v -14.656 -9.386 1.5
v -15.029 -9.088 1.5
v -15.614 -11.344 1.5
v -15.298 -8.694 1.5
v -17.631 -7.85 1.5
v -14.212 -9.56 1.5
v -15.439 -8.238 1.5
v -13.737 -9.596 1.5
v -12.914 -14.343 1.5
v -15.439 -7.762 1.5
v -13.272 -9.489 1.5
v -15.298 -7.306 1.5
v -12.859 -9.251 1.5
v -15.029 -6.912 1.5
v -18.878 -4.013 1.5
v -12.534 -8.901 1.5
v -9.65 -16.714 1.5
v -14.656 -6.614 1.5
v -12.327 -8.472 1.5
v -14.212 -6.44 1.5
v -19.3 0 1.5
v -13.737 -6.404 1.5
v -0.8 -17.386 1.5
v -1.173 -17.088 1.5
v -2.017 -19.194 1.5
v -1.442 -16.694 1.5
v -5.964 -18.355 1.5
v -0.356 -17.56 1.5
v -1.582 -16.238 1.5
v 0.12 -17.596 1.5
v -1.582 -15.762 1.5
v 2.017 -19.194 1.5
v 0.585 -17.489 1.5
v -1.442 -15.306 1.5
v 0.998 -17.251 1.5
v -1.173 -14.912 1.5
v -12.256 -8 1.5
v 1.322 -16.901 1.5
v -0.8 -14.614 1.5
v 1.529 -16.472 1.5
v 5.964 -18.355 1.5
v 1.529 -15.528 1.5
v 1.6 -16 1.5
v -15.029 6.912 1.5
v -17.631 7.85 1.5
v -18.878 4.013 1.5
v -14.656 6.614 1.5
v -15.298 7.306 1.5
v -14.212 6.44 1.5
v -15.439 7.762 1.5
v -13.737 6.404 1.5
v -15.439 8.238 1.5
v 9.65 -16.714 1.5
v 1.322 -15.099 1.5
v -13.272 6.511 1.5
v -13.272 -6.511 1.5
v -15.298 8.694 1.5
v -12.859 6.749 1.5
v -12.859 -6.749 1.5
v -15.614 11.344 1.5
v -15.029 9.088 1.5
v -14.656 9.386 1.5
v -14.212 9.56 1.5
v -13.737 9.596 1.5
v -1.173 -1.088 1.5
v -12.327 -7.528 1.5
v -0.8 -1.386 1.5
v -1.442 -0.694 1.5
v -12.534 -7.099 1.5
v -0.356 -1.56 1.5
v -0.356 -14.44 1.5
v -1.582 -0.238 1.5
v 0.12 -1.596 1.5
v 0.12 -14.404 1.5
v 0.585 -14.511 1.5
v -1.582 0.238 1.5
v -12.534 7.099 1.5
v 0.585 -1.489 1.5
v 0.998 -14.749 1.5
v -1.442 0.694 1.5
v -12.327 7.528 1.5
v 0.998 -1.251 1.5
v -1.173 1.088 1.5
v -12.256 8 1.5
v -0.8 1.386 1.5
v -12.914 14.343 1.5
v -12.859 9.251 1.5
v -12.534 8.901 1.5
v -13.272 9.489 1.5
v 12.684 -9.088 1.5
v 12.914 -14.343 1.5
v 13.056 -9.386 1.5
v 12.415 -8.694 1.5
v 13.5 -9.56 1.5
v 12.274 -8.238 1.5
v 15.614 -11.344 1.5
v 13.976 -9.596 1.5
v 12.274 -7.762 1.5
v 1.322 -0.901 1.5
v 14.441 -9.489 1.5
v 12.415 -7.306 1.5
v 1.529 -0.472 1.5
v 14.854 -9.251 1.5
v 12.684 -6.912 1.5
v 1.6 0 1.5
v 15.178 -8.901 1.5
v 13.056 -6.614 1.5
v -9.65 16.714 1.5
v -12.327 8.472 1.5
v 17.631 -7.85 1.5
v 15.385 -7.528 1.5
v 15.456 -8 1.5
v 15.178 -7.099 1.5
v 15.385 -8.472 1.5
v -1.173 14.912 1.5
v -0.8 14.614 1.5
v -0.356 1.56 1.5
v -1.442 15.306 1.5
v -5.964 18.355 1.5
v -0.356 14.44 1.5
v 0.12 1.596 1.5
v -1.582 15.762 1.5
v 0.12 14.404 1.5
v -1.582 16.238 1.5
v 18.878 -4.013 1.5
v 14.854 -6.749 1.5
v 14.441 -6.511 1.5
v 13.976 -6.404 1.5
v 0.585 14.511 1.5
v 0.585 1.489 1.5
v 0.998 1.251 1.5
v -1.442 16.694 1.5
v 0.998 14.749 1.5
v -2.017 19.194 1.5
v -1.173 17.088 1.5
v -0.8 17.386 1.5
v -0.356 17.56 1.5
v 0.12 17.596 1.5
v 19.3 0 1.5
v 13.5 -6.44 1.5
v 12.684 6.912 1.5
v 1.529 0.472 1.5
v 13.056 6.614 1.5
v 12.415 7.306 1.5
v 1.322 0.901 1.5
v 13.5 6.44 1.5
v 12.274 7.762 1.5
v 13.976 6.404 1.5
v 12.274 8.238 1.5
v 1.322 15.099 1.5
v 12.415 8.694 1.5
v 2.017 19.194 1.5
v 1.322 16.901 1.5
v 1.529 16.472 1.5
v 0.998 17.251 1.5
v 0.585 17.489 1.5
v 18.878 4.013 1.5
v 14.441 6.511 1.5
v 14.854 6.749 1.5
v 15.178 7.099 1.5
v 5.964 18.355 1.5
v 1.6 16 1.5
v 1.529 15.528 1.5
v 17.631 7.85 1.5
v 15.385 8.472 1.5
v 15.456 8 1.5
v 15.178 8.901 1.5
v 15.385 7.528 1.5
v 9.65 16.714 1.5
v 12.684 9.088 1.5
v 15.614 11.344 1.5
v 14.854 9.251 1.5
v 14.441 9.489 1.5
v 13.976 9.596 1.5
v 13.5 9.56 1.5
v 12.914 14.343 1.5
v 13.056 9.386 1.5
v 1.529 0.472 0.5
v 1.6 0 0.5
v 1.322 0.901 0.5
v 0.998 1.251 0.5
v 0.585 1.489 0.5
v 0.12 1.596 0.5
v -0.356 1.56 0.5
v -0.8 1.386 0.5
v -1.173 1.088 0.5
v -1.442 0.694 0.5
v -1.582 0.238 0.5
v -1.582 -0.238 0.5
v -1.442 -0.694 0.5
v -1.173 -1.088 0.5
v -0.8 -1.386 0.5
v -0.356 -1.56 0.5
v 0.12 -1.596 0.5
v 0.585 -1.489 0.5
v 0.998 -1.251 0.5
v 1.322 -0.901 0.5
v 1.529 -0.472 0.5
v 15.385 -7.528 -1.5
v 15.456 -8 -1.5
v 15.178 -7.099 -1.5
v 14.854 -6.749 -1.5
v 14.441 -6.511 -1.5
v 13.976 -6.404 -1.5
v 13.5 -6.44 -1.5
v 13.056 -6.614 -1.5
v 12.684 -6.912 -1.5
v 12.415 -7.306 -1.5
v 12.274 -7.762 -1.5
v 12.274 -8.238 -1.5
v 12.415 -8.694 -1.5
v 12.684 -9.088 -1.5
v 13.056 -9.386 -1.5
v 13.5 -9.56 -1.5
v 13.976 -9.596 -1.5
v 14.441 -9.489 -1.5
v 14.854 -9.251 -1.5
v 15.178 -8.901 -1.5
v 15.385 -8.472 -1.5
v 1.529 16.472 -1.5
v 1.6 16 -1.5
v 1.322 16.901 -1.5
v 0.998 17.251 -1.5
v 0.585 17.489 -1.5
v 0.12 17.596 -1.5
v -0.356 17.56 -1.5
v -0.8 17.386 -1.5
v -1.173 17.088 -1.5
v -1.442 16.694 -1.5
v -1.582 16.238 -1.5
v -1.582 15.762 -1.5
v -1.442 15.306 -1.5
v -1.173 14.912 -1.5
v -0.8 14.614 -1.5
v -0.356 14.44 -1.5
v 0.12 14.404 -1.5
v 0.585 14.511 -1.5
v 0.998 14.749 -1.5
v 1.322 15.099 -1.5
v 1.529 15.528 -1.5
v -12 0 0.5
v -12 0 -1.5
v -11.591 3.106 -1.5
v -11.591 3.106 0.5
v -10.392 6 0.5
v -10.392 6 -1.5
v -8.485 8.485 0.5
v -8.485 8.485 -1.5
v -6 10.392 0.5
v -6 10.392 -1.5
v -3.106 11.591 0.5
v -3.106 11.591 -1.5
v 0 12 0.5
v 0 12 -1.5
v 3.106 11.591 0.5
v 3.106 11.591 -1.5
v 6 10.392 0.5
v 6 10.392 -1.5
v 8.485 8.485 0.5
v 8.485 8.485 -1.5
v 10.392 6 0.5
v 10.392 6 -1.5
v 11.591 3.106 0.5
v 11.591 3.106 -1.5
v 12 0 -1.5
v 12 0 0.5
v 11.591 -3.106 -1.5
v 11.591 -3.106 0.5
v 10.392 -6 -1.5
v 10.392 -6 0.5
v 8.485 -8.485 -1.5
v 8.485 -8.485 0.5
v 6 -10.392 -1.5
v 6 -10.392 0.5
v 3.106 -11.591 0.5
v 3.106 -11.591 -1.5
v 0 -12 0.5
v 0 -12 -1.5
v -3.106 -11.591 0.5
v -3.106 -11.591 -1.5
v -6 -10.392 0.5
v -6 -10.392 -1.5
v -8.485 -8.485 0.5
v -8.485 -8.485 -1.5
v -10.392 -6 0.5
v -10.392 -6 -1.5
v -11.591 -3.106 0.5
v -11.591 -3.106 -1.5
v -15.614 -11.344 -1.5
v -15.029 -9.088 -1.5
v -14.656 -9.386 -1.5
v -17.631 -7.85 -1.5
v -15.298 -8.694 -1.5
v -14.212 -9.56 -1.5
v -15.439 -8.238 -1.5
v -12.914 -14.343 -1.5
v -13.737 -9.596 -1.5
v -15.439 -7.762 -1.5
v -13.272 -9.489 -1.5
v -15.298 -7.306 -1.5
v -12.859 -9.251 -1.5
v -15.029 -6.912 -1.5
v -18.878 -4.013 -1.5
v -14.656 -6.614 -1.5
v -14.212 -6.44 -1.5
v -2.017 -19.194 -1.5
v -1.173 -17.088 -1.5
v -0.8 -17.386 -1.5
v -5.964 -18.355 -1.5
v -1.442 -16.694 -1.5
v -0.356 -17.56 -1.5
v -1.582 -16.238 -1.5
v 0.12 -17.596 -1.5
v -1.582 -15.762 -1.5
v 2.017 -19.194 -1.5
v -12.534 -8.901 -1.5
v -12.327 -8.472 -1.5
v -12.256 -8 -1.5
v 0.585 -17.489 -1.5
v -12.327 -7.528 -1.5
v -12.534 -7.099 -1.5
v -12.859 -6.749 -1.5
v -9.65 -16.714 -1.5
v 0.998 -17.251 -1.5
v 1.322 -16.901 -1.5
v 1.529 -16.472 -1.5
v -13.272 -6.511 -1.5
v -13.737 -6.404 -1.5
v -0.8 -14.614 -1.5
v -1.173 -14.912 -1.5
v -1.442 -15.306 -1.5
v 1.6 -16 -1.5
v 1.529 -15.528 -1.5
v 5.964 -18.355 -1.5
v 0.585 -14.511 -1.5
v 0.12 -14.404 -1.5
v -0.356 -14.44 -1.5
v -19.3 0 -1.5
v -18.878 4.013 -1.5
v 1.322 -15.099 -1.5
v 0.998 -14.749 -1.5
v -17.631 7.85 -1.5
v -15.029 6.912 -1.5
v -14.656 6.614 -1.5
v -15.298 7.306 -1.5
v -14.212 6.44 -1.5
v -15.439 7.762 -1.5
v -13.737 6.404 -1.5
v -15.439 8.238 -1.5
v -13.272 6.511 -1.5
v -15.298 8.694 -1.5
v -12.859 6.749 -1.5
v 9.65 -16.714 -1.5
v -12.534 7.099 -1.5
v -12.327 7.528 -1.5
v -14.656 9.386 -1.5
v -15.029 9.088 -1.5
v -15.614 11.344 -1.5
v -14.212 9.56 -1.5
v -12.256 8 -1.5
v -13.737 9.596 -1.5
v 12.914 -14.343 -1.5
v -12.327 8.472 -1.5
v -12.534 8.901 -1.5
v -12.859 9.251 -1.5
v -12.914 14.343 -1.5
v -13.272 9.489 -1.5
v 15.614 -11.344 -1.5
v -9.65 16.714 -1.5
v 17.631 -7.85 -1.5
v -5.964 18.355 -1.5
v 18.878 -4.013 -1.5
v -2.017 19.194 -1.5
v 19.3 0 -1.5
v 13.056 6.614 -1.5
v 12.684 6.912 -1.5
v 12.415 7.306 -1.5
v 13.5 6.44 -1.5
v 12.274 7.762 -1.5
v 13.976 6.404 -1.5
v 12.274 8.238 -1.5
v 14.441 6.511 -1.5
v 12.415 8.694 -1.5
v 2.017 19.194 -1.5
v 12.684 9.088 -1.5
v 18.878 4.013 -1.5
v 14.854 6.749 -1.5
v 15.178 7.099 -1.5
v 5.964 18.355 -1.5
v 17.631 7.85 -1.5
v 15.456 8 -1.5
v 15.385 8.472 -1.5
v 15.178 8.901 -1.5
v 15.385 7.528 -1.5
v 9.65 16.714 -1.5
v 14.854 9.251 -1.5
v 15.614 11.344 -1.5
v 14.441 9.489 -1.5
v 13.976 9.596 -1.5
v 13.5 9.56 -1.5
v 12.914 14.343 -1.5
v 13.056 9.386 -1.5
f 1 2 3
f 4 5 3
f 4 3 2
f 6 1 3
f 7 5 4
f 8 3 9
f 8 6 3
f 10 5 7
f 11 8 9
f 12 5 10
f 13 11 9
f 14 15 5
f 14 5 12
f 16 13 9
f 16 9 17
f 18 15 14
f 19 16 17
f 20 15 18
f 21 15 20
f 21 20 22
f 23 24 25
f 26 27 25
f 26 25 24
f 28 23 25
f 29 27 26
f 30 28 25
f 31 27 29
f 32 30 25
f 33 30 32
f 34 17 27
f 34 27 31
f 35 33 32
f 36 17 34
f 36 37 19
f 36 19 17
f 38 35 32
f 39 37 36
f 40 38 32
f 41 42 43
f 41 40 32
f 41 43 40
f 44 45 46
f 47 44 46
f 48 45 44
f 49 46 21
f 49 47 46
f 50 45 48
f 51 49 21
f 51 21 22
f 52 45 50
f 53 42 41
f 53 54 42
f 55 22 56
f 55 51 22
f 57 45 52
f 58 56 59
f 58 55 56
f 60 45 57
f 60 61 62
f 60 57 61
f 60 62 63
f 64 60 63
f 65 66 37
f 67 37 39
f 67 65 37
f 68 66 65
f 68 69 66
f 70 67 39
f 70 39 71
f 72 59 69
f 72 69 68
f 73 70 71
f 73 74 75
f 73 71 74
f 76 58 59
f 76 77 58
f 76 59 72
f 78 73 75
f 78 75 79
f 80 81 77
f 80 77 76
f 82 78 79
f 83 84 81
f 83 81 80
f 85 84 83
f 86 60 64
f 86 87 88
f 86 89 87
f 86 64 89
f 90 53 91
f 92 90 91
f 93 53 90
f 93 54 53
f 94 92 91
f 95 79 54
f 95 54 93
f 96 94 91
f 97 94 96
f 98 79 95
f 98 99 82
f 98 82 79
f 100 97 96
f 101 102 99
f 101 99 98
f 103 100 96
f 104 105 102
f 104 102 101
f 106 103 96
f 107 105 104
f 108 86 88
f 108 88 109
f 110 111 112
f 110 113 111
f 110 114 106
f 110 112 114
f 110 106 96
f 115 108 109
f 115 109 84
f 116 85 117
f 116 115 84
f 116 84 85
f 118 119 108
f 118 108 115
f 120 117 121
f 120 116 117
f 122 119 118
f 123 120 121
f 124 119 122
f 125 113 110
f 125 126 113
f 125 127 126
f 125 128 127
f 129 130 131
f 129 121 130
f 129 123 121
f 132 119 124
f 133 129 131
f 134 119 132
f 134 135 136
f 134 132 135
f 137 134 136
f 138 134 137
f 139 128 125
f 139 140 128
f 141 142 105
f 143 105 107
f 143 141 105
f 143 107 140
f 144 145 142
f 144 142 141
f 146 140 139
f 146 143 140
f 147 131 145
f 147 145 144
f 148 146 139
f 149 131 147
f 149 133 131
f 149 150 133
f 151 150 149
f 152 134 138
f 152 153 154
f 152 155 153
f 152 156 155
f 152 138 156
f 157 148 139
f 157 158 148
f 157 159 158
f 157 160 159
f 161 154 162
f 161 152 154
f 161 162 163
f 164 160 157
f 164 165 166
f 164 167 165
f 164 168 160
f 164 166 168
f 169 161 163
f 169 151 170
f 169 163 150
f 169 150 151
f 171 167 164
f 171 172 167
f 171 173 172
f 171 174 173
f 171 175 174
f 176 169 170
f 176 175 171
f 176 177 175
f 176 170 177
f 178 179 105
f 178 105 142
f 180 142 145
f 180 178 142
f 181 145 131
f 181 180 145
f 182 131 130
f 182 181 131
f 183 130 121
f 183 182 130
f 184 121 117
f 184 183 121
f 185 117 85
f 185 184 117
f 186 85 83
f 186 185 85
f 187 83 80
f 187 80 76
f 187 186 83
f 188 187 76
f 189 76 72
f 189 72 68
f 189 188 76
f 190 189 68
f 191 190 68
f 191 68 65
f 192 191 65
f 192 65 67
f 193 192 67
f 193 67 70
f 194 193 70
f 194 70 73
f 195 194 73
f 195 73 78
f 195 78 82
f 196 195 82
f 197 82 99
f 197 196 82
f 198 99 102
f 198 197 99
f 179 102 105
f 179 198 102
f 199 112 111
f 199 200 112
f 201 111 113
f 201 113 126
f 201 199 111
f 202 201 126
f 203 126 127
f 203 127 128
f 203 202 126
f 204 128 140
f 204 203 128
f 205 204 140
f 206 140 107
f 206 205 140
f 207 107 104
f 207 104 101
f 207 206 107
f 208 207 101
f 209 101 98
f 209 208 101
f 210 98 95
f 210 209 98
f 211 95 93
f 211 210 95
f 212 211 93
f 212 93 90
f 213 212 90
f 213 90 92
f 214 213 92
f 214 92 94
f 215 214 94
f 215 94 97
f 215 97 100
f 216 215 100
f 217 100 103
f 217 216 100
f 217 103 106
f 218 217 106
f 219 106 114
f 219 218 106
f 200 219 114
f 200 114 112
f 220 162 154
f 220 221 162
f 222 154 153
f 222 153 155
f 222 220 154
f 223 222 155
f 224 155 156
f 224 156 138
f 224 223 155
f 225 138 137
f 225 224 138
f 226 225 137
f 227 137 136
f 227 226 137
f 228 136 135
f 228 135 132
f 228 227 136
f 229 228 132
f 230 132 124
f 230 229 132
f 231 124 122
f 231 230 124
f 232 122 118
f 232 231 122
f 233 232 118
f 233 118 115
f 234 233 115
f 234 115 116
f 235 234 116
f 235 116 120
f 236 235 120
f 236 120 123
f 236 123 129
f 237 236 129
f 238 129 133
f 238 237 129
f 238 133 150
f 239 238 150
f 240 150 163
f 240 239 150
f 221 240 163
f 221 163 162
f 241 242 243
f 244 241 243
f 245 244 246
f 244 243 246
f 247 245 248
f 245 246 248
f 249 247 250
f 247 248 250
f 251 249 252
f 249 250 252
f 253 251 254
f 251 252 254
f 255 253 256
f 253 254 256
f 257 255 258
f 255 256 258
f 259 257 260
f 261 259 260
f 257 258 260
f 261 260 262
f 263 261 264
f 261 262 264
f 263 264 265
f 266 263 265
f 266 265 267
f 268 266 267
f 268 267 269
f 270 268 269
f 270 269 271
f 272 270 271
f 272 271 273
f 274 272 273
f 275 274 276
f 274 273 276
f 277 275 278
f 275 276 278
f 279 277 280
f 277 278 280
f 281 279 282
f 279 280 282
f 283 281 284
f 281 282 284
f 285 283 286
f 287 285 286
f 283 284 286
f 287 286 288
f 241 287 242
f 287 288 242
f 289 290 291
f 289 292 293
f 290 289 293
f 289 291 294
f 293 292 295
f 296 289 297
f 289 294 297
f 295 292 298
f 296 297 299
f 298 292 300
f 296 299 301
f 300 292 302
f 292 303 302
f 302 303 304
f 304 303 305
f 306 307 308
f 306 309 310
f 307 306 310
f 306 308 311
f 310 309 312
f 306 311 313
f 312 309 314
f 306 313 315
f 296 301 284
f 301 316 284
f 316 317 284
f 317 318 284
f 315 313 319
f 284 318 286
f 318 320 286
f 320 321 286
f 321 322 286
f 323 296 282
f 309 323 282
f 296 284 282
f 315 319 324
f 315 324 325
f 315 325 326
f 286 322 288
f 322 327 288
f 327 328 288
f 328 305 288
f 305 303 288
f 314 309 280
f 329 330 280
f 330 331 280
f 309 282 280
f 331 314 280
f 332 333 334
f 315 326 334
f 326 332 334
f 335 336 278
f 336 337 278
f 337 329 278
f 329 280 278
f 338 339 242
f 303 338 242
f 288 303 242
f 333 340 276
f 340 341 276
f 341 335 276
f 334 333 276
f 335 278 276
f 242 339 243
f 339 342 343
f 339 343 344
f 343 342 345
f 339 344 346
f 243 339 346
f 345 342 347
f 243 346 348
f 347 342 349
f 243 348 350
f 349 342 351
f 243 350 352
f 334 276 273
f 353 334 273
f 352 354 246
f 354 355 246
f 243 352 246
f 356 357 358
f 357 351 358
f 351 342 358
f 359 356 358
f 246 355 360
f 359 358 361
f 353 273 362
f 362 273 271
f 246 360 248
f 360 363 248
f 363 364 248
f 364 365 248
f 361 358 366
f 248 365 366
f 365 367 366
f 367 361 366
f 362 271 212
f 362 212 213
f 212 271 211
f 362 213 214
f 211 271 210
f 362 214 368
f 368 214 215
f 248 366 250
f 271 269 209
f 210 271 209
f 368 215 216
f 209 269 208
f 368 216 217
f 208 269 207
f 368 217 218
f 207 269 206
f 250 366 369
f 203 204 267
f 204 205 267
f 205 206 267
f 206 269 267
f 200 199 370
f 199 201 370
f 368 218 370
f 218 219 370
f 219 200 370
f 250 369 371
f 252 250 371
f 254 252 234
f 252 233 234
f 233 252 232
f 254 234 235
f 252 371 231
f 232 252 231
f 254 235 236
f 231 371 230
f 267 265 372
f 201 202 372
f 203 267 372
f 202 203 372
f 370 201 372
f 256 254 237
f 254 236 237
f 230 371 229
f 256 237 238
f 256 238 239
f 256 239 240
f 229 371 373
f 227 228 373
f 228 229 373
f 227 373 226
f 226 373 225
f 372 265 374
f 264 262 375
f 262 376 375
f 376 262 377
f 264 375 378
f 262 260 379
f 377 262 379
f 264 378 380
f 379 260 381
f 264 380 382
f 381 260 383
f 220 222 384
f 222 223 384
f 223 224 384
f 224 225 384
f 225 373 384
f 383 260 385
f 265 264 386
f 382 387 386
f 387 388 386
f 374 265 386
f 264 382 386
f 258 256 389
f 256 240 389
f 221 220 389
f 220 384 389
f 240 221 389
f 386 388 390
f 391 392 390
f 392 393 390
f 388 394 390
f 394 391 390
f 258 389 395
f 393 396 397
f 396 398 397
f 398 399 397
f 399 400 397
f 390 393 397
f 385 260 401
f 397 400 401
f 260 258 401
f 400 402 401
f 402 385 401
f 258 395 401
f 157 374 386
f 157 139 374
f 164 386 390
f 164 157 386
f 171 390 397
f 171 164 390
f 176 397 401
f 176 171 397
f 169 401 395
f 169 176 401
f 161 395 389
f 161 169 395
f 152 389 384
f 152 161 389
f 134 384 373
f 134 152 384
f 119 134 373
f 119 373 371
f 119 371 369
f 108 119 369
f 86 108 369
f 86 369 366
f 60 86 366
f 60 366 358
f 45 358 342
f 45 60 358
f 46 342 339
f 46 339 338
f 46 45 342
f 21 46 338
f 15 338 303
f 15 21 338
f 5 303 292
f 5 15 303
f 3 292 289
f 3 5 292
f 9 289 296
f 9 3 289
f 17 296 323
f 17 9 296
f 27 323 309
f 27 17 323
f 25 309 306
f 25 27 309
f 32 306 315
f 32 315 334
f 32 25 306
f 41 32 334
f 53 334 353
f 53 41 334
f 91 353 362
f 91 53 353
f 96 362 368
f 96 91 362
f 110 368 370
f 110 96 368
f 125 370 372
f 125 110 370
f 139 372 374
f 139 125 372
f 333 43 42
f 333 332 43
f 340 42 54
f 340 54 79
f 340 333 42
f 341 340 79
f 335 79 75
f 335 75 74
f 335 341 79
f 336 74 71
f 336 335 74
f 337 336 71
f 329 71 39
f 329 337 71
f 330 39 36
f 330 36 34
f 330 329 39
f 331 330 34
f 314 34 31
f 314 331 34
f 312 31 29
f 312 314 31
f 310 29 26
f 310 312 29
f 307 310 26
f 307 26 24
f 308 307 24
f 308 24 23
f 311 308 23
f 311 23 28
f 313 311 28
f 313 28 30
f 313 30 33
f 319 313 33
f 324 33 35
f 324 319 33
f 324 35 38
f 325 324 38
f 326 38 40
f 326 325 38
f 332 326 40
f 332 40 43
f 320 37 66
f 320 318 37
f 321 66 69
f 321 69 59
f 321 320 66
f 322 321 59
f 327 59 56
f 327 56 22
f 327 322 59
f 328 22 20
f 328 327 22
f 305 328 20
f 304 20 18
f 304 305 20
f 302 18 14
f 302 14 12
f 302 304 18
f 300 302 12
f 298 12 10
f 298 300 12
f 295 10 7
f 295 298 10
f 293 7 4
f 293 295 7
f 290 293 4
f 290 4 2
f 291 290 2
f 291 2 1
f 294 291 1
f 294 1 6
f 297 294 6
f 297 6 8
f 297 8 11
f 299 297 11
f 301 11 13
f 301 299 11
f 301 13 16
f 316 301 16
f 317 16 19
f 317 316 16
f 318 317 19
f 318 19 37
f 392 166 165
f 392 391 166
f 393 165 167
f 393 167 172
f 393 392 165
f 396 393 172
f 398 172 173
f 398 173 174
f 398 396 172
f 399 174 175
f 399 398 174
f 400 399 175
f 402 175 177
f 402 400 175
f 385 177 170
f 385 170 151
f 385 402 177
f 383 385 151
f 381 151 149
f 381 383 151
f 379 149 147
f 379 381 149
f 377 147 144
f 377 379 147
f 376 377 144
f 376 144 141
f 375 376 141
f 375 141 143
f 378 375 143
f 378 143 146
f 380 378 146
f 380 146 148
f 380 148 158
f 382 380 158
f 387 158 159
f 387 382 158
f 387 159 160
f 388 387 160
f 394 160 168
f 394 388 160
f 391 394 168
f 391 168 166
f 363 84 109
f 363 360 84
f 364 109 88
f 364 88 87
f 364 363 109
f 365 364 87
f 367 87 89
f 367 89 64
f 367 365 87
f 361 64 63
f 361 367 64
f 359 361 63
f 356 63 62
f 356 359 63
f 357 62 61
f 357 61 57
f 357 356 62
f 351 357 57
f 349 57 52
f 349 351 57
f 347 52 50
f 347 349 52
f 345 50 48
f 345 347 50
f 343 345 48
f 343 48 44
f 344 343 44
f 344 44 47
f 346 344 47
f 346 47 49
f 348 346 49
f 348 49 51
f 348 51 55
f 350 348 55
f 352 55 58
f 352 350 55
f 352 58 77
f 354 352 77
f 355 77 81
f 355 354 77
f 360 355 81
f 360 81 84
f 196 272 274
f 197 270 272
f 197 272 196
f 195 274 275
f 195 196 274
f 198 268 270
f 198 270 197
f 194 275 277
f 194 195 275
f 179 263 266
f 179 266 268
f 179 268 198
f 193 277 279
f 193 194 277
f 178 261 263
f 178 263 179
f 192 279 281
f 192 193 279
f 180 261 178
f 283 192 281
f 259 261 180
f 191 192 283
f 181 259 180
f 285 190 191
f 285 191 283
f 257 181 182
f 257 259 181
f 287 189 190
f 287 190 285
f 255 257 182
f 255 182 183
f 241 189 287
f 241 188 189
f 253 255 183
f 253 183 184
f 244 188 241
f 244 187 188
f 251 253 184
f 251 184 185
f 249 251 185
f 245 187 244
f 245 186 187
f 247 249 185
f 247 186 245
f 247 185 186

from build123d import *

# Parameters (mm, degrees)
CROQUIS1_R              = 19.3
CROQUIS1_R_2            = 1.6
SALIENTE_EXTRUIR1_DEPTH = 1.5
CROQUIS2_R              = 12
CROQUIS2_R_2            = 1.6
CORTAR_EXTRUIR1_DEPTH   = 2


with BuildPart() as part:
    # Croquis1 → Saliente-Extruir1 (new, symmetric)
    with BuildSketch(Plane.XY):
        Circle(CROQUIS1_R)
        with Locations((0, 16)):
            Circle(CROQUIS1_R_2, mode=Mode.SUBTRACT)
        Circle(CROQUIS1_R_2, mode=Mode.SUBTRACT)
        with Locations((13.856406461, 8)):
            Circle(CROQUIS1_R_2, mode=Mode.SUBTRACT)
        with Locations((13.856406461, -8)):
            Circle(CROQUIS1_R_2, mode=Mode.SUBTRACT)
        with Locations((0, -16)):
            Circle(CROQUIS1_R_2, mode=Mode.SUBTRACT)
        with Locations((-13.856406461, -8)):
            Circle(CROQUIS1_R_2, mode=Mode.SUBTRACT)
        with Locations((-13.856406461, 8)):
            Circle(CROQUIS1_R_2, mode=Mode.SUBTRACT)
    extrude(amount=SALIENTE_EXTRUIR1_DEPTH, both=True)

    # Croquis2 → Cortar-Extruir1 (cut)
    with BuildSketch(Plane(origin=(0, 0, -1.5), x_dir=(-1, 0, 0), z_dir=(0, 0, -1))):
        Circle(CROQUIS2_R)
        Circle(CROQUIS2_R_2, mode=Mode.SUBTRACT)
    extrude(amount=-CORTAR_EXTRUIR1_DEPTH, mode=Mode.SUBTRACT)


solid = part.part
